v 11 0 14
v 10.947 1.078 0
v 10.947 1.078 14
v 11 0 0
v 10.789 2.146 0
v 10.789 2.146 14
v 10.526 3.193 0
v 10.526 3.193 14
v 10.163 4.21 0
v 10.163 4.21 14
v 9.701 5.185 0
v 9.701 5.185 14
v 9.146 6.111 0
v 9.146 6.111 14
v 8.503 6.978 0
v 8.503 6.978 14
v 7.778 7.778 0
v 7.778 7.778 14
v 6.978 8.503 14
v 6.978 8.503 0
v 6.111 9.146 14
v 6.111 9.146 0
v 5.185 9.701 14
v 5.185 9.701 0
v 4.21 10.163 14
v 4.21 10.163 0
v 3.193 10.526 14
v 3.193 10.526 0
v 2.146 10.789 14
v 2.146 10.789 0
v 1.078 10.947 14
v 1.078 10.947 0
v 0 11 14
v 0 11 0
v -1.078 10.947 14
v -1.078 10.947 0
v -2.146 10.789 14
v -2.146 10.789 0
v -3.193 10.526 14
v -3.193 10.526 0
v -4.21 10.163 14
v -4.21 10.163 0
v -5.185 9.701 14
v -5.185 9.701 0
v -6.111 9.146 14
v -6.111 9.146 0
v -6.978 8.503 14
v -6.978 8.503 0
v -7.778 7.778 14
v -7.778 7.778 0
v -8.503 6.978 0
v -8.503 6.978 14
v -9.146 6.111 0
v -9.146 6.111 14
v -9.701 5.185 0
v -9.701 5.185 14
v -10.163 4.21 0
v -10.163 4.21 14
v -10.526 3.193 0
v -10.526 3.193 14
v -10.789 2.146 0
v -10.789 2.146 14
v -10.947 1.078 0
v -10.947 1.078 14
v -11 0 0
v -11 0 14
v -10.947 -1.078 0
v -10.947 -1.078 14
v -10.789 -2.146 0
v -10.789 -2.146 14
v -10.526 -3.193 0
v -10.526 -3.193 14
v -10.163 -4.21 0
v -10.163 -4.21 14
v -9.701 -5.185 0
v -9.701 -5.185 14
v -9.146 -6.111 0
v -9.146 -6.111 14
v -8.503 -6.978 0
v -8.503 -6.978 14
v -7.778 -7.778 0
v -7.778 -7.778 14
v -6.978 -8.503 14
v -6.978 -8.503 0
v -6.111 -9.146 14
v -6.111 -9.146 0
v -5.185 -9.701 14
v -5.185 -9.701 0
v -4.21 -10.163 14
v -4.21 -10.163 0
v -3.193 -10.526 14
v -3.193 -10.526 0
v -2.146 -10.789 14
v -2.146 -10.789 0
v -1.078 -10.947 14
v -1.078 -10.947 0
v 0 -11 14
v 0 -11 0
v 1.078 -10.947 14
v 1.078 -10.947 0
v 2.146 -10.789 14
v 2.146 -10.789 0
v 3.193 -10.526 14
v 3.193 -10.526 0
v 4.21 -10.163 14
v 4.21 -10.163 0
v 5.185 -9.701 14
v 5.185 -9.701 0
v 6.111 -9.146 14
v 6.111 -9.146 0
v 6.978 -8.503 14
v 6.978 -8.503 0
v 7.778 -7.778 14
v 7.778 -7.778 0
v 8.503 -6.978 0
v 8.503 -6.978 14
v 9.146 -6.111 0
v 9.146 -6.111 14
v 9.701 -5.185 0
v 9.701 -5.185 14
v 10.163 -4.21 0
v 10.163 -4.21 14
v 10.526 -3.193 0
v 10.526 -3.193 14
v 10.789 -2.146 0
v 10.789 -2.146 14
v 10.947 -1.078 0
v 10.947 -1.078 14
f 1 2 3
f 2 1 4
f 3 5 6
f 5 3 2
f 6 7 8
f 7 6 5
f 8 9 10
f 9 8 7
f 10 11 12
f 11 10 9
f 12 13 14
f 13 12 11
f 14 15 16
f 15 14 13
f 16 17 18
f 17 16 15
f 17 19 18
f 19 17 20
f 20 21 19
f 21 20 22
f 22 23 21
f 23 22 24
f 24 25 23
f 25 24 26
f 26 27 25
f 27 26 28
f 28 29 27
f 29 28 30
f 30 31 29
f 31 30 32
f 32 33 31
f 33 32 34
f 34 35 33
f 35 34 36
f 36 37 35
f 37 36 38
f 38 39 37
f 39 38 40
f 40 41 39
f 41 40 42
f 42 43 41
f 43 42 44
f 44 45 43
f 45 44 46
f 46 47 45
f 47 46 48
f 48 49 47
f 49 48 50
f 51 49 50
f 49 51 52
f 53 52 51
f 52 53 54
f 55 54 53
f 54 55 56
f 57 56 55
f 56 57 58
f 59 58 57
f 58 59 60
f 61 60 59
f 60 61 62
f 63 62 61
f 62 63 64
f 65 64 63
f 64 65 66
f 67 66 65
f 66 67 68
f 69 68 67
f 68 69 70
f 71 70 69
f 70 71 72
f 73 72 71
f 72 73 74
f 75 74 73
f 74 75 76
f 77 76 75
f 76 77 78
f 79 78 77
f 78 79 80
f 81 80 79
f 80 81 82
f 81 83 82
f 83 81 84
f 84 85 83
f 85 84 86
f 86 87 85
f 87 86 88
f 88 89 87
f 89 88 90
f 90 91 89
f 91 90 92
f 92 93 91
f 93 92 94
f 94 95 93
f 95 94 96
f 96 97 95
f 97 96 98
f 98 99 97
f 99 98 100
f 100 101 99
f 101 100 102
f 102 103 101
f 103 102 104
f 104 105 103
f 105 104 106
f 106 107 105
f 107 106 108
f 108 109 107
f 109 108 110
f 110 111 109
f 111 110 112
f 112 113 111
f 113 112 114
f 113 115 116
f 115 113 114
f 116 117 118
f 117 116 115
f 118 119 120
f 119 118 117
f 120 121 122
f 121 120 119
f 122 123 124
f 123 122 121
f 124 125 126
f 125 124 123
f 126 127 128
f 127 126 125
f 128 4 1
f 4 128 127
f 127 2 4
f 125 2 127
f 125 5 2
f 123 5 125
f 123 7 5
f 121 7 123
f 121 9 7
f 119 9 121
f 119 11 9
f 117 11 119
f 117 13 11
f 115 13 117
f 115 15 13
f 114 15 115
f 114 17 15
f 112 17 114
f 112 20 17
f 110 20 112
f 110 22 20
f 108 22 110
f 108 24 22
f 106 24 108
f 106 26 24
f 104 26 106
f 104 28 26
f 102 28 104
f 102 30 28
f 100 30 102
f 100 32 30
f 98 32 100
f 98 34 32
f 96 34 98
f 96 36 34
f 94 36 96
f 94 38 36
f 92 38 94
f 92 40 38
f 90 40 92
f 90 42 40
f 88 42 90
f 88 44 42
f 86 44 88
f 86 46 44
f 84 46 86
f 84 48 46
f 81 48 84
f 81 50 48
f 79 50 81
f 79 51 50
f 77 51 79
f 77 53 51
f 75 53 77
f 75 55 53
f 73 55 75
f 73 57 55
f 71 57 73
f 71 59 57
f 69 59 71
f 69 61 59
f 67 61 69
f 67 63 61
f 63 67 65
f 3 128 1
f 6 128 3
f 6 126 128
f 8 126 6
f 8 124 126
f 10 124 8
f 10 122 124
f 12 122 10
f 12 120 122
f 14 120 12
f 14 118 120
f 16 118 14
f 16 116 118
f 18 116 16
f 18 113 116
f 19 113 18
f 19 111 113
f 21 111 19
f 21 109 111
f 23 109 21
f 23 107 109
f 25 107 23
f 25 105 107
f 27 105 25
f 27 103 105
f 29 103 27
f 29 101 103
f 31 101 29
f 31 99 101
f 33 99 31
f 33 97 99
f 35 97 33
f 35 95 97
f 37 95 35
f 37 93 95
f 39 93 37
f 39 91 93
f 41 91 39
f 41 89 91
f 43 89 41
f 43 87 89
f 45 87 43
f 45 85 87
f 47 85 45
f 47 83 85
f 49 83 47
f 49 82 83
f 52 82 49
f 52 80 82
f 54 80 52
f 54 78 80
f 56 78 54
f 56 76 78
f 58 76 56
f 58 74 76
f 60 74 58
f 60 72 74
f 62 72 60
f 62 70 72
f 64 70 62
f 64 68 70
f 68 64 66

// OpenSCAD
// Mic arm 3/8"-16 to camera 1/4"-20 adapter (parser fixture)

/* [Fit - radial clearance per side, mm] */
ext_clear = 0.20;
int_clear = 0.25;

/* [Body] */
// Outer diameter of the knurled body
body_d = 22; // [14:0.5:40]
body_h = 14; // [8:30]
knurl = true;
knurl_count = 24; // [8:2:48]

/* [3/8"-16 socket (bottom, female)] */
socket_depth = 10; // [5:0.5:20]
socket_chamfer = 0.8;

/* [1/4"-20 stud (top, male)] */
stud_len = 8; // [4:0.5:15]
stud_tip = "chamfer"; // [chamfer:Chamfered, flat:Flat, round:Rounded]

/* [Quality] */
$fn = 64; // [16:8:128]
thread_steps = 32; // [16, 32, 48, 64]

/* [Hidden] */
INCH = 25.4;
socket_major = 0.375 * INCH;

module adapter() {
  inside_module = 1;
  cylinder(d = body_d, h = body_h);
}

adapter();
after_module = 5;
